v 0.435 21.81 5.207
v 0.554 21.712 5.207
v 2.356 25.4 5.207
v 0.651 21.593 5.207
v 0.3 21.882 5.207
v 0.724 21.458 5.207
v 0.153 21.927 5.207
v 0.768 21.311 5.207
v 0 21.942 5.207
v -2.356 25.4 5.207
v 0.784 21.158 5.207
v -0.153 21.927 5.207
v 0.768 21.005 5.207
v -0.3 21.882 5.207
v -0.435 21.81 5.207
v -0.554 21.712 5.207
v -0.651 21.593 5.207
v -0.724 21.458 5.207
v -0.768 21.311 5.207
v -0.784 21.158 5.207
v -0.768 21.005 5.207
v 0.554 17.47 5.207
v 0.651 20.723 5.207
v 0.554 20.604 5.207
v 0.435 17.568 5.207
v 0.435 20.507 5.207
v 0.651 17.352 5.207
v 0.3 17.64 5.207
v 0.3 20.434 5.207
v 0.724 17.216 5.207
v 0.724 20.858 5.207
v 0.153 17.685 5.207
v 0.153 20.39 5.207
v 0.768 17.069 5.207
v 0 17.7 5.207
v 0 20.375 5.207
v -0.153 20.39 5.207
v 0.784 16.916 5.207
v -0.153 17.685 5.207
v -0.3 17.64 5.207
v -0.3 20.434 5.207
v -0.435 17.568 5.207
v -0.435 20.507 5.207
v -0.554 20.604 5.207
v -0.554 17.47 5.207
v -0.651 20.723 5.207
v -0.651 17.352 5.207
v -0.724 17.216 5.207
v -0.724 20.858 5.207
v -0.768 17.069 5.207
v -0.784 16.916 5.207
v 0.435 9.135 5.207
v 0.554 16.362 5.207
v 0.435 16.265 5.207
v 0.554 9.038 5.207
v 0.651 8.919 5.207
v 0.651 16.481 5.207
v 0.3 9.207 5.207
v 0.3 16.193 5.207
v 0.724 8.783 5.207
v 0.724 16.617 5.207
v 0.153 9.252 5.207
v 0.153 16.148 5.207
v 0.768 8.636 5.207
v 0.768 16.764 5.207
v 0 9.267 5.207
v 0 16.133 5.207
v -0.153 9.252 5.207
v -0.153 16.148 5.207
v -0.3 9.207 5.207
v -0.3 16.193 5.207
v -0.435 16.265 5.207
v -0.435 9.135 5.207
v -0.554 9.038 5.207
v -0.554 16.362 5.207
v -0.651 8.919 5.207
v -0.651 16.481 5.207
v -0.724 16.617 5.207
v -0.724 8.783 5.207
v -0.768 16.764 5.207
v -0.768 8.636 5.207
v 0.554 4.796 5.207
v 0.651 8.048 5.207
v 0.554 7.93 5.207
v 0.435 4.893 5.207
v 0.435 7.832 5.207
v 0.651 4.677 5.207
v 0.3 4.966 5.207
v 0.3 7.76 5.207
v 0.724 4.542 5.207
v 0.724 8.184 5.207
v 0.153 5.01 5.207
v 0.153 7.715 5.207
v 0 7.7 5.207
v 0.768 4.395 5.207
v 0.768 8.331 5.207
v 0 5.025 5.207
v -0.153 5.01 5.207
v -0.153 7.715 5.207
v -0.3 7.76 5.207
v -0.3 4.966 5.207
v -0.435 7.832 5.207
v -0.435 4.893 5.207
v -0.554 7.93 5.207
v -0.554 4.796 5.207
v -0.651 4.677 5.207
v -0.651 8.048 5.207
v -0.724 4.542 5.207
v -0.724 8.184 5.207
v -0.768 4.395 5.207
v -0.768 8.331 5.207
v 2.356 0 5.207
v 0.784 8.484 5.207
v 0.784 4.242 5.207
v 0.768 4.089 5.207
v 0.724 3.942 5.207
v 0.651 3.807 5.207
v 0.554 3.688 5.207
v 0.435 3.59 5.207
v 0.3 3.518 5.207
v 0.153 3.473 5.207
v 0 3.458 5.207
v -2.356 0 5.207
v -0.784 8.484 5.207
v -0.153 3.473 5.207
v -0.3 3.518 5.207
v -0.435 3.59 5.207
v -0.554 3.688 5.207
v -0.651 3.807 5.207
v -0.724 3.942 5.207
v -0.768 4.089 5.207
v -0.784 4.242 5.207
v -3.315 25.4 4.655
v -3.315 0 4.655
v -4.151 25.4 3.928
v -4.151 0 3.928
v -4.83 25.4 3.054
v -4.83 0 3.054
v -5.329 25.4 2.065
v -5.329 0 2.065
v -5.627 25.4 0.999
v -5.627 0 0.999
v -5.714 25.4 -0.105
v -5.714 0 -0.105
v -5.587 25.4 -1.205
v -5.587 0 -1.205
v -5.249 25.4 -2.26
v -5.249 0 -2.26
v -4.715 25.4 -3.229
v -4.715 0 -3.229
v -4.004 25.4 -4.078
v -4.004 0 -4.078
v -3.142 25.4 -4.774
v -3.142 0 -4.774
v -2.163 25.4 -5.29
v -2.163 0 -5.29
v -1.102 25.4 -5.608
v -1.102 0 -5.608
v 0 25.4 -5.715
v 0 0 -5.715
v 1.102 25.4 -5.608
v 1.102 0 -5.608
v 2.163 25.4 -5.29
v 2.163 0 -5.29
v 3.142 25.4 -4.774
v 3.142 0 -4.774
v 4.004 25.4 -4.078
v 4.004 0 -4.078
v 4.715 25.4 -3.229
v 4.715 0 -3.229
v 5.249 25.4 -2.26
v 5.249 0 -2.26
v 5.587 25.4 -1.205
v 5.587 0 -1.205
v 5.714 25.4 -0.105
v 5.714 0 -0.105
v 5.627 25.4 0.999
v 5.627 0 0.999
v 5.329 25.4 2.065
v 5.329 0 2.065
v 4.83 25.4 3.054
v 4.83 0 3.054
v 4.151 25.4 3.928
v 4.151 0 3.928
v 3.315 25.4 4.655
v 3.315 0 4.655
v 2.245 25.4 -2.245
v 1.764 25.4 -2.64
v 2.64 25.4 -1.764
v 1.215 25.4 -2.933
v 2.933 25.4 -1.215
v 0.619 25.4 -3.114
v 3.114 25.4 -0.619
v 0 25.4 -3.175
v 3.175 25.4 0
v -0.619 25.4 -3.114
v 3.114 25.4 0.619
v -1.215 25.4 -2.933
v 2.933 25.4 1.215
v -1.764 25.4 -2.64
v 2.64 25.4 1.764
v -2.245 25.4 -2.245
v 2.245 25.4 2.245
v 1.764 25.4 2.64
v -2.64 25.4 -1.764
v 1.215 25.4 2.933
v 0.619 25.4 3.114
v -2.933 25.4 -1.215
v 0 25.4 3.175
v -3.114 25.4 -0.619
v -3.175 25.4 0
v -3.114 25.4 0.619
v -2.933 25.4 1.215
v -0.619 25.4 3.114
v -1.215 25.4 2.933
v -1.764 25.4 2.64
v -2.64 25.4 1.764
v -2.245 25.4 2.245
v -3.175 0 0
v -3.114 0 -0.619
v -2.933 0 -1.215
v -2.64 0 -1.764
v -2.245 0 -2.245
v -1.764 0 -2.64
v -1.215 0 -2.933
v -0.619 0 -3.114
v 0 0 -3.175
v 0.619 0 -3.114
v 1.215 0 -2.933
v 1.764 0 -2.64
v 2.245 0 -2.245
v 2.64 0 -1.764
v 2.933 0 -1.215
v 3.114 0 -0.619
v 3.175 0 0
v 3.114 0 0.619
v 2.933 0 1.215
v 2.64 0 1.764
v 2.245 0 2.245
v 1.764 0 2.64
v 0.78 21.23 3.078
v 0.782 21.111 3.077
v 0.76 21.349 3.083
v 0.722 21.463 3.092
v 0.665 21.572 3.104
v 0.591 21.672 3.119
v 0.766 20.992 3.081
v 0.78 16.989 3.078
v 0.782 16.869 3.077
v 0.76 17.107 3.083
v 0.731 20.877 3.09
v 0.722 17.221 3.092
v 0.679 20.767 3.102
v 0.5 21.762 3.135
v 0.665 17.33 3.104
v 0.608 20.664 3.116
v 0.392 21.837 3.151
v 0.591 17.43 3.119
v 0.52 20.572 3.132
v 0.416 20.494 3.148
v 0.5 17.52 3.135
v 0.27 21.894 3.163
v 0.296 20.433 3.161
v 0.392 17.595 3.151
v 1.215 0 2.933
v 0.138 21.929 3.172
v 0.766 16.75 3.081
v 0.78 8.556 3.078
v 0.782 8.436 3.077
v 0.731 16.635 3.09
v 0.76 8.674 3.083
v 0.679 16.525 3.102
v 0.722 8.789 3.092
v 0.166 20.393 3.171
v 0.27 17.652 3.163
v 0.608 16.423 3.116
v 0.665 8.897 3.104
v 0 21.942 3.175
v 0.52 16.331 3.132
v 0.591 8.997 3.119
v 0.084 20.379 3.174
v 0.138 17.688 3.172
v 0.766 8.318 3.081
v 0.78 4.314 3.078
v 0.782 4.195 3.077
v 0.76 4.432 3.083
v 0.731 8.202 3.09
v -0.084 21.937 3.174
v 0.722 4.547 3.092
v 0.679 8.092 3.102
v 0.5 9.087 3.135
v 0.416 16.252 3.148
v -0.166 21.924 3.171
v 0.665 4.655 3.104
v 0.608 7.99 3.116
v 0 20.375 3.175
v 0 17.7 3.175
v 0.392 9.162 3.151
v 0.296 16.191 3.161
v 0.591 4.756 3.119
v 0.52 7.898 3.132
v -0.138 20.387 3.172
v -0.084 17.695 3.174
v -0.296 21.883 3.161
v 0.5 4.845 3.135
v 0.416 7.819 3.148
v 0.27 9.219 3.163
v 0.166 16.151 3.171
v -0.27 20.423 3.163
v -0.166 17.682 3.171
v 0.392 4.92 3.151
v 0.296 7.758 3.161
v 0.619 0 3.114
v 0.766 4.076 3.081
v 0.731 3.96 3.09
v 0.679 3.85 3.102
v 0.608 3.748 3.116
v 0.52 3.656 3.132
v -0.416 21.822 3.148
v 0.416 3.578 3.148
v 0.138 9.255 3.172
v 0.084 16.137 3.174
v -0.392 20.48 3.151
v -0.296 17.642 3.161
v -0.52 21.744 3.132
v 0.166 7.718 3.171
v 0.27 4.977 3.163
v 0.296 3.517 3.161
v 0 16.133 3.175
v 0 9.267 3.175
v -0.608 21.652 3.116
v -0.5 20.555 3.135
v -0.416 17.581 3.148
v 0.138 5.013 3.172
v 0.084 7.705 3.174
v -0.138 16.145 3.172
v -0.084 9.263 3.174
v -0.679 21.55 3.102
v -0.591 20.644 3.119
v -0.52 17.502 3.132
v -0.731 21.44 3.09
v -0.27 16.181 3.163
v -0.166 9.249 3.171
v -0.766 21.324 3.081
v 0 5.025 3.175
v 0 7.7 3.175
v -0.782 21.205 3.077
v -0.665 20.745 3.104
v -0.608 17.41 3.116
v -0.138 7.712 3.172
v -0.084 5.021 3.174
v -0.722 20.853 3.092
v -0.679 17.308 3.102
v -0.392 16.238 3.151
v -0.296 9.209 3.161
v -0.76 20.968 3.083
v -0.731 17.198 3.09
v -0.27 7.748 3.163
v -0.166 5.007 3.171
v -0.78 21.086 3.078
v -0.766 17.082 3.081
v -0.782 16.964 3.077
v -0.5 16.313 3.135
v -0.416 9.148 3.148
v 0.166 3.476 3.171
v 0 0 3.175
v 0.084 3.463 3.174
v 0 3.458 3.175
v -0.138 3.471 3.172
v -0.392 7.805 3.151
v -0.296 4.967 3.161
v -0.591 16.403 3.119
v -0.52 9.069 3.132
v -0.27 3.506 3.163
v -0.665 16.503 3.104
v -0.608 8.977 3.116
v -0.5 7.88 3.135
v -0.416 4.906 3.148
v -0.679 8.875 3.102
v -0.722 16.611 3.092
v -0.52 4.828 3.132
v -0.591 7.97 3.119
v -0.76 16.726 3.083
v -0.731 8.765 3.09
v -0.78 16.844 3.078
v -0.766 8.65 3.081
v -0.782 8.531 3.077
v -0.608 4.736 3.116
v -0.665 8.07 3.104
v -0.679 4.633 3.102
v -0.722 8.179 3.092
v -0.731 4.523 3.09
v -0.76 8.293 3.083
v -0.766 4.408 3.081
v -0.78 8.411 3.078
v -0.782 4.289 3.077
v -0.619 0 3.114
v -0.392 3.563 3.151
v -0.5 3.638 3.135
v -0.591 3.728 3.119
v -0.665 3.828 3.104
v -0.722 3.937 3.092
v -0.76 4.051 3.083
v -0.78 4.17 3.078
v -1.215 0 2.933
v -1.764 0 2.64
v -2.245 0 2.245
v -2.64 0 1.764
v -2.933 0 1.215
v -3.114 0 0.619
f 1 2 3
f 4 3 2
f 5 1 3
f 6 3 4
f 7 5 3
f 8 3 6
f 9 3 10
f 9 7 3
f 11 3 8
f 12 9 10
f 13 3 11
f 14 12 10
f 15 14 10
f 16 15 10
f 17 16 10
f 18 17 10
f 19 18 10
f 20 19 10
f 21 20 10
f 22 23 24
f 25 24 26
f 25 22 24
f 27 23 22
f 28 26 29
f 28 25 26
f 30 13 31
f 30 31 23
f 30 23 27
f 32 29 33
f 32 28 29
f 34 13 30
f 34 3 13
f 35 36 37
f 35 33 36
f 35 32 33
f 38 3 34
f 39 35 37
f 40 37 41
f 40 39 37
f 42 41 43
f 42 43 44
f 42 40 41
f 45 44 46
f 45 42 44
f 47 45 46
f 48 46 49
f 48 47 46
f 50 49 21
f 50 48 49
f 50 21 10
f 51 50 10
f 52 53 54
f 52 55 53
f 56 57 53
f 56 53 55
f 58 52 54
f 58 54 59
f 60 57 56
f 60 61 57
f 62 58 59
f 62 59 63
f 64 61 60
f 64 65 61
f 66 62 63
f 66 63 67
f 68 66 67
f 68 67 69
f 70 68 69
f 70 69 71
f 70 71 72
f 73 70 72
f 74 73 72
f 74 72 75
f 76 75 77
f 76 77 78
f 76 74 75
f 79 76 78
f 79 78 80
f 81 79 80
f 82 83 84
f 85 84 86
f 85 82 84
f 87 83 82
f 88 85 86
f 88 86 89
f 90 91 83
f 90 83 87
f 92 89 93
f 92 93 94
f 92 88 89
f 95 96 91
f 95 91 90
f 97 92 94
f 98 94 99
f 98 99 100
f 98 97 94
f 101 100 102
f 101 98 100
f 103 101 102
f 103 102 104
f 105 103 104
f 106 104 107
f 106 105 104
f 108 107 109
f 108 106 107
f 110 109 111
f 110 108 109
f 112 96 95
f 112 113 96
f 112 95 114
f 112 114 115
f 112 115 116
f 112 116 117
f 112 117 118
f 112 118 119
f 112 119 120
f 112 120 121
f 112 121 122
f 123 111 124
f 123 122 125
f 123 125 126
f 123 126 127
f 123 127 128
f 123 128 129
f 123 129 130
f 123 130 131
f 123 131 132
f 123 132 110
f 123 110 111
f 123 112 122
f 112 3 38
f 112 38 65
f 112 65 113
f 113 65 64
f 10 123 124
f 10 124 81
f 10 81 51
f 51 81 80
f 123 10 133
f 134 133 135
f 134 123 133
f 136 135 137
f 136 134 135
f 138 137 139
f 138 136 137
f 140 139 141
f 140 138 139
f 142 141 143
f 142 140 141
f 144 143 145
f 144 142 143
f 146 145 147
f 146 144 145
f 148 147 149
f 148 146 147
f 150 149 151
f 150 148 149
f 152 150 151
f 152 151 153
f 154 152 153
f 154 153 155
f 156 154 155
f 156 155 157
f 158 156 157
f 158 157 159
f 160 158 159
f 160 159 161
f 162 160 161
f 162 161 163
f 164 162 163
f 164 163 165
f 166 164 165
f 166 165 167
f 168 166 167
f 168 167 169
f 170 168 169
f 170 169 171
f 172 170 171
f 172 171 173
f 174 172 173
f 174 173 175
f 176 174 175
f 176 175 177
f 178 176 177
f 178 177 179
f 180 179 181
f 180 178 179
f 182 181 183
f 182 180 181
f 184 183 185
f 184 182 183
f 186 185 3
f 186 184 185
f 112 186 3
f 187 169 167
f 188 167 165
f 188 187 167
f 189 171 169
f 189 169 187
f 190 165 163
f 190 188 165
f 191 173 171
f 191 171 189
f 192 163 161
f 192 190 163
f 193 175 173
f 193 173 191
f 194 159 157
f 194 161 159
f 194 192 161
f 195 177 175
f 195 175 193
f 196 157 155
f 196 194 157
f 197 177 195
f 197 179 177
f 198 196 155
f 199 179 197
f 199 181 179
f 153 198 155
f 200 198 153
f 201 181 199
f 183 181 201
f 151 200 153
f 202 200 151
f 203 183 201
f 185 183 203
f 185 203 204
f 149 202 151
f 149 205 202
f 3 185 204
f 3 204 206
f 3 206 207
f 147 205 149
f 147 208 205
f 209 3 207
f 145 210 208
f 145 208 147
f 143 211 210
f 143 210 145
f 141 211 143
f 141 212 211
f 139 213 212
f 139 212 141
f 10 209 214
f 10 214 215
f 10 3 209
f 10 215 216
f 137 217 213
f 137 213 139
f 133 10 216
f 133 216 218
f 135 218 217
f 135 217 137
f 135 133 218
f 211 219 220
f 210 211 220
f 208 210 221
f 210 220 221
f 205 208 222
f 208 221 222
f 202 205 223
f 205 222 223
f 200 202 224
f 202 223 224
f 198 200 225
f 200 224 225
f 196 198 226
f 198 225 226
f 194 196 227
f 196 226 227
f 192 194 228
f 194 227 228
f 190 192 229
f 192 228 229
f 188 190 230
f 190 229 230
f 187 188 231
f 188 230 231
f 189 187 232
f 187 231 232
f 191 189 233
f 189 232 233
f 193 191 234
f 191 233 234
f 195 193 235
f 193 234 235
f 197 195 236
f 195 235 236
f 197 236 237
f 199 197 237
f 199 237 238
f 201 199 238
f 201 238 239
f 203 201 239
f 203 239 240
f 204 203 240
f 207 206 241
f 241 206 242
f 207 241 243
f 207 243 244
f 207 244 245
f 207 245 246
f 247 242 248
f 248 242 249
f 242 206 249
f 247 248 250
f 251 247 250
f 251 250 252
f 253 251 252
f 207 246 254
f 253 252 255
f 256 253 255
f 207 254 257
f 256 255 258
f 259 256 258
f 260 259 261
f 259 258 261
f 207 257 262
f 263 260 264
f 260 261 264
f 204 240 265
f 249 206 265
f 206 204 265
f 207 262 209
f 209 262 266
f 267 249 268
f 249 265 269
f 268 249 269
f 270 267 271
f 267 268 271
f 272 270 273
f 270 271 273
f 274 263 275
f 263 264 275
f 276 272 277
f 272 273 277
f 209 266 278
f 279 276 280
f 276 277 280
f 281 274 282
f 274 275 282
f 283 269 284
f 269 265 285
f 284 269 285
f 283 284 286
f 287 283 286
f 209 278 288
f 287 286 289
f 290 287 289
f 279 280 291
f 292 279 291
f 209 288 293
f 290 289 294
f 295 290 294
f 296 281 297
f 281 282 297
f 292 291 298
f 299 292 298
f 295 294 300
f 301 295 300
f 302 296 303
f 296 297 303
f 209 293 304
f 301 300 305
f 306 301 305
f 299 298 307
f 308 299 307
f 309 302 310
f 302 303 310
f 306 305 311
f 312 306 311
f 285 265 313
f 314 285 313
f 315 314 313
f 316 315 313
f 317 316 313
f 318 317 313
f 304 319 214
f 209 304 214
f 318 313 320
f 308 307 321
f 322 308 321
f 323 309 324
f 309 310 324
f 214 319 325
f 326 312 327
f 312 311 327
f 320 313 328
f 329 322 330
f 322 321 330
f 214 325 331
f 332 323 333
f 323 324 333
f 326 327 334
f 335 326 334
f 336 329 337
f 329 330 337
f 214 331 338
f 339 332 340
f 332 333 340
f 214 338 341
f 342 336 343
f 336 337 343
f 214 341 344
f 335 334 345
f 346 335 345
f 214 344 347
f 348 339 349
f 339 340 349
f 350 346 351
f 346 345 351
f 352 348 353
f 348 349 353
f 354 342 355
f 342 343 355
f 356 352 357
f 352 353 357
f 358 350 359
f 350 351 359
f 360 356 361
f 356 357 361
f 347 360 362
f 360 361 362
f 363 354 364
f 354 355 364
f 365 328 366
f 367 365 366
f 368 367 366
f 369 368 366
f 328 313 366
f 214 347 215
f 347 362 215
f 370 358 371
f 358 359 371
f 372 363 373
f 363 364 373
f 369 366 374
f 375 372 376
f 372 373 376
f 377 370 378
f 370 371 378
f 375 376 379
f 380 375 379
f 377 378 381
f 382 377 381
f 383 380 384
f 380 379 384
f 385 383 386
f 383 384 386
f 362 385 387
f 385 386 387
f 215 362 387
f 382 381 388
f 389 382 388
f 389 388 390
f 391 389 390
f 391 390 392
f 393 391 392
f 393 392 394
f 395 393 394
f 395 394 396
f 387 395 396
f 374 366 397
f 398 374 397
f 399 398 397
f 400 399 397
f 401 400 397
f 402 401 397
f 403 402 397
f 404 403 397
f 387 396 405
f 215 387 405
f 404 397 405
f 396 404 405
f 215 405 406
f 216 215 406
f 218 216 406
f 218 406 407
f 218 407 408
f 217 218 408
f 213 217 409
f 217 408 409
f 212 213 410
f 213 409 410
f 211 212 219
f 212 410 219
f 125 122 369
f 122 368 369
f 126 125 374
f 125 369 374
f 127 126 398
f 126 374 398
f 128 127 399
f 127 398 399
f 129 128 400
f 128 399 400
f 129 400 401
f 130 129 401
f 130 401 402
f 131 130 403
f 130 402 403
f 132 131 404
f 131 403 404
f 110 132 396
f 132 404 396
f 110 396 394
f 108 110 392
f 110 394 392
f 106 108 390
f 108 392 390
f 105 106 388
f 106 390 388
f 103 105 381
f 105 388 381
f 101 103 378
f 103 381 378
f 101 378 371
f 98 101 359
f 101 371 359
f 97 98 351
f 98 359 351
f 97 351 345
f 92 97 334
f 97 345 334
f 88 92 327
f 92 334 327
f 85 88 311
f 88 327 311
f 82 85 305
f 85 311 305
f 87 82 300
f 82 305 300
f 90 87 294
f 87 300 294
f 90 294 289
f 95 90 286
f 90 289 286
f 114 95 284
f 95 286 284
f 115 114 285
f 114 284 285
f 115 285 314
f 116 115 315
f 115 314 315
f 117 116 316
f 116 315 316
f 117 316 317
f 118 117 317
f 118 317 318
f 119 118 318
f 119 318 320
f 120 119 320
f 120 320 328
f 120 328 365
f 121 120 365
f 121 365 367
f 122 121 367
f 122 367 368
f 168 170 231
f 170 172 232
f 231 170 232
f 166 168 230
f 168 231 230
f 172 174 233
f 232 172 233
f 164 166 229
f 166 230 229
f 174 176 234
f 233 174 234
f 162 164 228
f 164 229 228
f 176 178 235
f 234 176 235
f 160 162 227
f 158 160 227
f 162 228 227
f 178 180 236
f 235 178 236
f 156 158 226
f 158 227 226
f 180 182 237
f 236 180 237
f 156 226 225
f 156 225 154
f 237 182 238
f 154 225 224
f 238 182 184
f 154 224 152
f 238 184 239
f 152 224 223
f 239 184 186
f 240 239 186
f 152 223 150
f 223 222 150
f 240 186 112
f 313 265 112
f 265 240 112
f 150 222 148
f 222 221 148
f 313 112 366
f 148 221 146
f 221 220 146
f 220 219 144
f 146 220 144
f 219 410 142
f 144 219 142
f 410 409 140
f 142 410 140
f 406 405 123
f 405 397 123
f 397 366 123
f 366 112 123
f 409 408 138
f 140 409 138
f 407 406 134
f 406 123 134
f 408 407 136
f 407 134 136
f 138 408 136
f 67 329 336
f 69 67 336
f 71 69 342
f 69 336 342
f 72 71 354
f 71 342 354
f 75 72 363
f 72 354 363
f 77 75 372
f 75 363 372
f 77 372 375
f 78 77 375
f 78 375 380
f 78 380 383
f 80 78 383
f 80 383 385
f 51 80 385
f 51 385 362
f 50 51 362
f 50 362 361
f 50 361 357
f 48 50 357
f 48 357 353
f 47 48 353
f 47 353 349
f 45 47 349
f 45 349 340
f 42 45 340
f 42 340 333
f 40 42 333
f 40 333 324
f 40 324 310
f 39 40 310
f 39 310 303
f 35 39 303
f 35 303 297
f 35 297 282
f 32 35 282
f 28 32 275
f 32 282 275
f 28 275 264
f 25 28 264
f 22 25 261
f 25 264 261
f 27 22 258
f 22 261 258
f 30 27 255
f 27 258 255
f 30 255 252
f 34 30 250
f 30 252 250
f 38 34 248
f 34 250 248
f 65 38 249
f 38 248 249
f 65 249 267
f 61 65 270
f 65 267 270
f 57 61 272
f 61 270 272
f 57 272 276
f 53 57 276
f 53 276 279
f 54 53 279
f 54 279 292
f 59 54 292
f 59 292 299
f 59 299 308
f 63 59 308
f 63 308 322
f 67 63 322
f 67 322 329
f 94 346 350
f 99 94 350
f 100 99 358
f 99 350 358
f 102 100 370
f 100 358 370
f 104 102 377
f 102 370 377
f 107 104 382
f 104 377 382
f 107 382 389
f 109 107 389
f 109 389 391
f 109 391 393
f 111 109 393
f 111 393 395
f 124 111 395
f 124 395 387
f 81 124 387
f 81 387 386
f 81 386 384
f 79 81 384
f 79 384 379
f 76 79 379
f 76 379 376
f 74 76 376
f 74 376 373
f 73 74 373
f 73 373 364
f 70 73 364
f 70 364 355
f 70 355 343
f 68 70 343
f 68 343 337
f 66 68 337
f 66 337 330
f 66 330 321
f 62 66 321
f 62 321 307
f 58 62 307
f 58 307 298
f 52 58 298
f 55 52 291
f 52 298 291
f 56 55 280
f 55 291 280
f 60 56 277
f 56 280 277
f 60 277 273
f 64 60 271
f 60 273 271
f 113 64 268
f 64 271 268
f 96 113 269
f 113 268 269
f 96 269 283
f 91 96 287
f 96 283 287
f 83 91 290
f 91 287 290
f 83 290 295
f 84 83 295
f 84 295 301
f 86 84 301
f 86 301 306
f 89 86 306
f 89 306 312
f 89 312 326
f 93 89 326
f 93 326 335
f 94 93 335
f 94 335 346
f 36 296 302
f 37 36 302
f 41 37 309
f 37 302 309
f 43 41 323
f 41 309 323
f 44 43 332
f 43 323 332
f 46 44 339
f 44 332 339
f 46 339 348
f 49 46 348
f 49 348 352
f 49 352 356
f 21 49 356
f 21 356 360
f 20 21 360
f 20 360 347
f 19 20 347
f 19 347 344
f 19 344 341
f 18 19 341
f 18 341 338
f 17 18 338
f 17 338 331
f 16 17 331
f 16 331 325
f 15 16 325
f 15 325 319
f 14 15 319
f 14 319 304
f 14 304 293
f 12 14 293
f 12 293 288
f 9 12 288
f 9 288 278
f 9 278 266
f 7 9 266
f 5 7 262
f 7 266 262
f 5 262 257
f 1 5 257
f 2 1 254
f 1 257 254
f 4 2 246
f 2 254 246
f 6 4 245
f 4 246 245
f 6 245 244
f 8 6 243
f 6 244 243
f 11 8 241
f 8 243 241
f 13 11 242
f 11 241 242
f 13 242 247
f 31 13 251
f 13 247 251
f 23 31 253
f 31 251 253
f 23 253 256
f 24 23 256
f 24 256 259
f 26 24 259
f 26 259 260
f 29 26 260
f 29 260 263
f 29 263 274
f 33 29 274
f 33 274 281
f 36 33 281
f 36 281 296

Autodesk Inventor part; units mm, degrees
ref_plane "YZ Plane" through (0, 0, 0) normal (1, 0, 0) x (0, 1, 0)
ref_plane "XZ Plane" through (0, 0, 0) normal (0, 1, 0) x (-1, 0, 0)
ref_plane "XY Plane" through (0, 0, 0) normal (0, 0, 1) x (1, 0, 0)
sketch "Sketch10" plane through (0, 0, 0) normal (0, 1, 0) x (-1, 0, 0)
  circle A0 centre (0, 0) radius 3.175
  circle A1 centre (0, 0) radius 5.715
  line L0 (0, 3.175) -> (0, 5.207)
  line L1 (0, 5.207) -> (2.3555, 5.207)
  line L2 (-2.3555, 5.207) -> (0, 5.207)
  dimension "d61" = 6.35
  dimension "d62" = 11.43
  dimension "d63" = 2.032
extrude "Extrusion7" add sketch "Sketch10" along normal blind 25.4 contours A1 L2 L1 picked at (-1.045, 4.4973)
sketch "Sketch12" plane through (-2.3555, 0, 5.207) normal (0, 0, 1) x (1, 0, 0)
  line L0 (2.3555, 0) -> (2.3555, 4.2418)
  line L1 (2.3555, 4.2418) -> (2.3555, 8.4836)
  line L2 (8.0705, 25.4) -> (-3.3595, 25.4) projected
  line L3 (2.3555, 25.4) -> (2.3555, 21.1582)
  line L4 (2.3555, 21.1582) -> (2.3555, 16.9164)
  point P0 (4.711, 25.4)
  point P1 (0, 25.4)
  dimension "d66" = 4.2418
  dimension "d67" = 4.2418
  dimension "d68" = 4.2418
  dimension "d69" = 4.2418
hole "Hole5" at (0, 21.1582, 5.207) at (0, 16.9164, 5.207) at (0, 8.4836, 5.207) at (0, 4.2418, 5.207) direction (0, 0, -1) diameter 1.567 depth 6.2992 thread size "M2x0.4" class "6H" standard "ISO Metric profile"
properties part number "rotaryconnector"
